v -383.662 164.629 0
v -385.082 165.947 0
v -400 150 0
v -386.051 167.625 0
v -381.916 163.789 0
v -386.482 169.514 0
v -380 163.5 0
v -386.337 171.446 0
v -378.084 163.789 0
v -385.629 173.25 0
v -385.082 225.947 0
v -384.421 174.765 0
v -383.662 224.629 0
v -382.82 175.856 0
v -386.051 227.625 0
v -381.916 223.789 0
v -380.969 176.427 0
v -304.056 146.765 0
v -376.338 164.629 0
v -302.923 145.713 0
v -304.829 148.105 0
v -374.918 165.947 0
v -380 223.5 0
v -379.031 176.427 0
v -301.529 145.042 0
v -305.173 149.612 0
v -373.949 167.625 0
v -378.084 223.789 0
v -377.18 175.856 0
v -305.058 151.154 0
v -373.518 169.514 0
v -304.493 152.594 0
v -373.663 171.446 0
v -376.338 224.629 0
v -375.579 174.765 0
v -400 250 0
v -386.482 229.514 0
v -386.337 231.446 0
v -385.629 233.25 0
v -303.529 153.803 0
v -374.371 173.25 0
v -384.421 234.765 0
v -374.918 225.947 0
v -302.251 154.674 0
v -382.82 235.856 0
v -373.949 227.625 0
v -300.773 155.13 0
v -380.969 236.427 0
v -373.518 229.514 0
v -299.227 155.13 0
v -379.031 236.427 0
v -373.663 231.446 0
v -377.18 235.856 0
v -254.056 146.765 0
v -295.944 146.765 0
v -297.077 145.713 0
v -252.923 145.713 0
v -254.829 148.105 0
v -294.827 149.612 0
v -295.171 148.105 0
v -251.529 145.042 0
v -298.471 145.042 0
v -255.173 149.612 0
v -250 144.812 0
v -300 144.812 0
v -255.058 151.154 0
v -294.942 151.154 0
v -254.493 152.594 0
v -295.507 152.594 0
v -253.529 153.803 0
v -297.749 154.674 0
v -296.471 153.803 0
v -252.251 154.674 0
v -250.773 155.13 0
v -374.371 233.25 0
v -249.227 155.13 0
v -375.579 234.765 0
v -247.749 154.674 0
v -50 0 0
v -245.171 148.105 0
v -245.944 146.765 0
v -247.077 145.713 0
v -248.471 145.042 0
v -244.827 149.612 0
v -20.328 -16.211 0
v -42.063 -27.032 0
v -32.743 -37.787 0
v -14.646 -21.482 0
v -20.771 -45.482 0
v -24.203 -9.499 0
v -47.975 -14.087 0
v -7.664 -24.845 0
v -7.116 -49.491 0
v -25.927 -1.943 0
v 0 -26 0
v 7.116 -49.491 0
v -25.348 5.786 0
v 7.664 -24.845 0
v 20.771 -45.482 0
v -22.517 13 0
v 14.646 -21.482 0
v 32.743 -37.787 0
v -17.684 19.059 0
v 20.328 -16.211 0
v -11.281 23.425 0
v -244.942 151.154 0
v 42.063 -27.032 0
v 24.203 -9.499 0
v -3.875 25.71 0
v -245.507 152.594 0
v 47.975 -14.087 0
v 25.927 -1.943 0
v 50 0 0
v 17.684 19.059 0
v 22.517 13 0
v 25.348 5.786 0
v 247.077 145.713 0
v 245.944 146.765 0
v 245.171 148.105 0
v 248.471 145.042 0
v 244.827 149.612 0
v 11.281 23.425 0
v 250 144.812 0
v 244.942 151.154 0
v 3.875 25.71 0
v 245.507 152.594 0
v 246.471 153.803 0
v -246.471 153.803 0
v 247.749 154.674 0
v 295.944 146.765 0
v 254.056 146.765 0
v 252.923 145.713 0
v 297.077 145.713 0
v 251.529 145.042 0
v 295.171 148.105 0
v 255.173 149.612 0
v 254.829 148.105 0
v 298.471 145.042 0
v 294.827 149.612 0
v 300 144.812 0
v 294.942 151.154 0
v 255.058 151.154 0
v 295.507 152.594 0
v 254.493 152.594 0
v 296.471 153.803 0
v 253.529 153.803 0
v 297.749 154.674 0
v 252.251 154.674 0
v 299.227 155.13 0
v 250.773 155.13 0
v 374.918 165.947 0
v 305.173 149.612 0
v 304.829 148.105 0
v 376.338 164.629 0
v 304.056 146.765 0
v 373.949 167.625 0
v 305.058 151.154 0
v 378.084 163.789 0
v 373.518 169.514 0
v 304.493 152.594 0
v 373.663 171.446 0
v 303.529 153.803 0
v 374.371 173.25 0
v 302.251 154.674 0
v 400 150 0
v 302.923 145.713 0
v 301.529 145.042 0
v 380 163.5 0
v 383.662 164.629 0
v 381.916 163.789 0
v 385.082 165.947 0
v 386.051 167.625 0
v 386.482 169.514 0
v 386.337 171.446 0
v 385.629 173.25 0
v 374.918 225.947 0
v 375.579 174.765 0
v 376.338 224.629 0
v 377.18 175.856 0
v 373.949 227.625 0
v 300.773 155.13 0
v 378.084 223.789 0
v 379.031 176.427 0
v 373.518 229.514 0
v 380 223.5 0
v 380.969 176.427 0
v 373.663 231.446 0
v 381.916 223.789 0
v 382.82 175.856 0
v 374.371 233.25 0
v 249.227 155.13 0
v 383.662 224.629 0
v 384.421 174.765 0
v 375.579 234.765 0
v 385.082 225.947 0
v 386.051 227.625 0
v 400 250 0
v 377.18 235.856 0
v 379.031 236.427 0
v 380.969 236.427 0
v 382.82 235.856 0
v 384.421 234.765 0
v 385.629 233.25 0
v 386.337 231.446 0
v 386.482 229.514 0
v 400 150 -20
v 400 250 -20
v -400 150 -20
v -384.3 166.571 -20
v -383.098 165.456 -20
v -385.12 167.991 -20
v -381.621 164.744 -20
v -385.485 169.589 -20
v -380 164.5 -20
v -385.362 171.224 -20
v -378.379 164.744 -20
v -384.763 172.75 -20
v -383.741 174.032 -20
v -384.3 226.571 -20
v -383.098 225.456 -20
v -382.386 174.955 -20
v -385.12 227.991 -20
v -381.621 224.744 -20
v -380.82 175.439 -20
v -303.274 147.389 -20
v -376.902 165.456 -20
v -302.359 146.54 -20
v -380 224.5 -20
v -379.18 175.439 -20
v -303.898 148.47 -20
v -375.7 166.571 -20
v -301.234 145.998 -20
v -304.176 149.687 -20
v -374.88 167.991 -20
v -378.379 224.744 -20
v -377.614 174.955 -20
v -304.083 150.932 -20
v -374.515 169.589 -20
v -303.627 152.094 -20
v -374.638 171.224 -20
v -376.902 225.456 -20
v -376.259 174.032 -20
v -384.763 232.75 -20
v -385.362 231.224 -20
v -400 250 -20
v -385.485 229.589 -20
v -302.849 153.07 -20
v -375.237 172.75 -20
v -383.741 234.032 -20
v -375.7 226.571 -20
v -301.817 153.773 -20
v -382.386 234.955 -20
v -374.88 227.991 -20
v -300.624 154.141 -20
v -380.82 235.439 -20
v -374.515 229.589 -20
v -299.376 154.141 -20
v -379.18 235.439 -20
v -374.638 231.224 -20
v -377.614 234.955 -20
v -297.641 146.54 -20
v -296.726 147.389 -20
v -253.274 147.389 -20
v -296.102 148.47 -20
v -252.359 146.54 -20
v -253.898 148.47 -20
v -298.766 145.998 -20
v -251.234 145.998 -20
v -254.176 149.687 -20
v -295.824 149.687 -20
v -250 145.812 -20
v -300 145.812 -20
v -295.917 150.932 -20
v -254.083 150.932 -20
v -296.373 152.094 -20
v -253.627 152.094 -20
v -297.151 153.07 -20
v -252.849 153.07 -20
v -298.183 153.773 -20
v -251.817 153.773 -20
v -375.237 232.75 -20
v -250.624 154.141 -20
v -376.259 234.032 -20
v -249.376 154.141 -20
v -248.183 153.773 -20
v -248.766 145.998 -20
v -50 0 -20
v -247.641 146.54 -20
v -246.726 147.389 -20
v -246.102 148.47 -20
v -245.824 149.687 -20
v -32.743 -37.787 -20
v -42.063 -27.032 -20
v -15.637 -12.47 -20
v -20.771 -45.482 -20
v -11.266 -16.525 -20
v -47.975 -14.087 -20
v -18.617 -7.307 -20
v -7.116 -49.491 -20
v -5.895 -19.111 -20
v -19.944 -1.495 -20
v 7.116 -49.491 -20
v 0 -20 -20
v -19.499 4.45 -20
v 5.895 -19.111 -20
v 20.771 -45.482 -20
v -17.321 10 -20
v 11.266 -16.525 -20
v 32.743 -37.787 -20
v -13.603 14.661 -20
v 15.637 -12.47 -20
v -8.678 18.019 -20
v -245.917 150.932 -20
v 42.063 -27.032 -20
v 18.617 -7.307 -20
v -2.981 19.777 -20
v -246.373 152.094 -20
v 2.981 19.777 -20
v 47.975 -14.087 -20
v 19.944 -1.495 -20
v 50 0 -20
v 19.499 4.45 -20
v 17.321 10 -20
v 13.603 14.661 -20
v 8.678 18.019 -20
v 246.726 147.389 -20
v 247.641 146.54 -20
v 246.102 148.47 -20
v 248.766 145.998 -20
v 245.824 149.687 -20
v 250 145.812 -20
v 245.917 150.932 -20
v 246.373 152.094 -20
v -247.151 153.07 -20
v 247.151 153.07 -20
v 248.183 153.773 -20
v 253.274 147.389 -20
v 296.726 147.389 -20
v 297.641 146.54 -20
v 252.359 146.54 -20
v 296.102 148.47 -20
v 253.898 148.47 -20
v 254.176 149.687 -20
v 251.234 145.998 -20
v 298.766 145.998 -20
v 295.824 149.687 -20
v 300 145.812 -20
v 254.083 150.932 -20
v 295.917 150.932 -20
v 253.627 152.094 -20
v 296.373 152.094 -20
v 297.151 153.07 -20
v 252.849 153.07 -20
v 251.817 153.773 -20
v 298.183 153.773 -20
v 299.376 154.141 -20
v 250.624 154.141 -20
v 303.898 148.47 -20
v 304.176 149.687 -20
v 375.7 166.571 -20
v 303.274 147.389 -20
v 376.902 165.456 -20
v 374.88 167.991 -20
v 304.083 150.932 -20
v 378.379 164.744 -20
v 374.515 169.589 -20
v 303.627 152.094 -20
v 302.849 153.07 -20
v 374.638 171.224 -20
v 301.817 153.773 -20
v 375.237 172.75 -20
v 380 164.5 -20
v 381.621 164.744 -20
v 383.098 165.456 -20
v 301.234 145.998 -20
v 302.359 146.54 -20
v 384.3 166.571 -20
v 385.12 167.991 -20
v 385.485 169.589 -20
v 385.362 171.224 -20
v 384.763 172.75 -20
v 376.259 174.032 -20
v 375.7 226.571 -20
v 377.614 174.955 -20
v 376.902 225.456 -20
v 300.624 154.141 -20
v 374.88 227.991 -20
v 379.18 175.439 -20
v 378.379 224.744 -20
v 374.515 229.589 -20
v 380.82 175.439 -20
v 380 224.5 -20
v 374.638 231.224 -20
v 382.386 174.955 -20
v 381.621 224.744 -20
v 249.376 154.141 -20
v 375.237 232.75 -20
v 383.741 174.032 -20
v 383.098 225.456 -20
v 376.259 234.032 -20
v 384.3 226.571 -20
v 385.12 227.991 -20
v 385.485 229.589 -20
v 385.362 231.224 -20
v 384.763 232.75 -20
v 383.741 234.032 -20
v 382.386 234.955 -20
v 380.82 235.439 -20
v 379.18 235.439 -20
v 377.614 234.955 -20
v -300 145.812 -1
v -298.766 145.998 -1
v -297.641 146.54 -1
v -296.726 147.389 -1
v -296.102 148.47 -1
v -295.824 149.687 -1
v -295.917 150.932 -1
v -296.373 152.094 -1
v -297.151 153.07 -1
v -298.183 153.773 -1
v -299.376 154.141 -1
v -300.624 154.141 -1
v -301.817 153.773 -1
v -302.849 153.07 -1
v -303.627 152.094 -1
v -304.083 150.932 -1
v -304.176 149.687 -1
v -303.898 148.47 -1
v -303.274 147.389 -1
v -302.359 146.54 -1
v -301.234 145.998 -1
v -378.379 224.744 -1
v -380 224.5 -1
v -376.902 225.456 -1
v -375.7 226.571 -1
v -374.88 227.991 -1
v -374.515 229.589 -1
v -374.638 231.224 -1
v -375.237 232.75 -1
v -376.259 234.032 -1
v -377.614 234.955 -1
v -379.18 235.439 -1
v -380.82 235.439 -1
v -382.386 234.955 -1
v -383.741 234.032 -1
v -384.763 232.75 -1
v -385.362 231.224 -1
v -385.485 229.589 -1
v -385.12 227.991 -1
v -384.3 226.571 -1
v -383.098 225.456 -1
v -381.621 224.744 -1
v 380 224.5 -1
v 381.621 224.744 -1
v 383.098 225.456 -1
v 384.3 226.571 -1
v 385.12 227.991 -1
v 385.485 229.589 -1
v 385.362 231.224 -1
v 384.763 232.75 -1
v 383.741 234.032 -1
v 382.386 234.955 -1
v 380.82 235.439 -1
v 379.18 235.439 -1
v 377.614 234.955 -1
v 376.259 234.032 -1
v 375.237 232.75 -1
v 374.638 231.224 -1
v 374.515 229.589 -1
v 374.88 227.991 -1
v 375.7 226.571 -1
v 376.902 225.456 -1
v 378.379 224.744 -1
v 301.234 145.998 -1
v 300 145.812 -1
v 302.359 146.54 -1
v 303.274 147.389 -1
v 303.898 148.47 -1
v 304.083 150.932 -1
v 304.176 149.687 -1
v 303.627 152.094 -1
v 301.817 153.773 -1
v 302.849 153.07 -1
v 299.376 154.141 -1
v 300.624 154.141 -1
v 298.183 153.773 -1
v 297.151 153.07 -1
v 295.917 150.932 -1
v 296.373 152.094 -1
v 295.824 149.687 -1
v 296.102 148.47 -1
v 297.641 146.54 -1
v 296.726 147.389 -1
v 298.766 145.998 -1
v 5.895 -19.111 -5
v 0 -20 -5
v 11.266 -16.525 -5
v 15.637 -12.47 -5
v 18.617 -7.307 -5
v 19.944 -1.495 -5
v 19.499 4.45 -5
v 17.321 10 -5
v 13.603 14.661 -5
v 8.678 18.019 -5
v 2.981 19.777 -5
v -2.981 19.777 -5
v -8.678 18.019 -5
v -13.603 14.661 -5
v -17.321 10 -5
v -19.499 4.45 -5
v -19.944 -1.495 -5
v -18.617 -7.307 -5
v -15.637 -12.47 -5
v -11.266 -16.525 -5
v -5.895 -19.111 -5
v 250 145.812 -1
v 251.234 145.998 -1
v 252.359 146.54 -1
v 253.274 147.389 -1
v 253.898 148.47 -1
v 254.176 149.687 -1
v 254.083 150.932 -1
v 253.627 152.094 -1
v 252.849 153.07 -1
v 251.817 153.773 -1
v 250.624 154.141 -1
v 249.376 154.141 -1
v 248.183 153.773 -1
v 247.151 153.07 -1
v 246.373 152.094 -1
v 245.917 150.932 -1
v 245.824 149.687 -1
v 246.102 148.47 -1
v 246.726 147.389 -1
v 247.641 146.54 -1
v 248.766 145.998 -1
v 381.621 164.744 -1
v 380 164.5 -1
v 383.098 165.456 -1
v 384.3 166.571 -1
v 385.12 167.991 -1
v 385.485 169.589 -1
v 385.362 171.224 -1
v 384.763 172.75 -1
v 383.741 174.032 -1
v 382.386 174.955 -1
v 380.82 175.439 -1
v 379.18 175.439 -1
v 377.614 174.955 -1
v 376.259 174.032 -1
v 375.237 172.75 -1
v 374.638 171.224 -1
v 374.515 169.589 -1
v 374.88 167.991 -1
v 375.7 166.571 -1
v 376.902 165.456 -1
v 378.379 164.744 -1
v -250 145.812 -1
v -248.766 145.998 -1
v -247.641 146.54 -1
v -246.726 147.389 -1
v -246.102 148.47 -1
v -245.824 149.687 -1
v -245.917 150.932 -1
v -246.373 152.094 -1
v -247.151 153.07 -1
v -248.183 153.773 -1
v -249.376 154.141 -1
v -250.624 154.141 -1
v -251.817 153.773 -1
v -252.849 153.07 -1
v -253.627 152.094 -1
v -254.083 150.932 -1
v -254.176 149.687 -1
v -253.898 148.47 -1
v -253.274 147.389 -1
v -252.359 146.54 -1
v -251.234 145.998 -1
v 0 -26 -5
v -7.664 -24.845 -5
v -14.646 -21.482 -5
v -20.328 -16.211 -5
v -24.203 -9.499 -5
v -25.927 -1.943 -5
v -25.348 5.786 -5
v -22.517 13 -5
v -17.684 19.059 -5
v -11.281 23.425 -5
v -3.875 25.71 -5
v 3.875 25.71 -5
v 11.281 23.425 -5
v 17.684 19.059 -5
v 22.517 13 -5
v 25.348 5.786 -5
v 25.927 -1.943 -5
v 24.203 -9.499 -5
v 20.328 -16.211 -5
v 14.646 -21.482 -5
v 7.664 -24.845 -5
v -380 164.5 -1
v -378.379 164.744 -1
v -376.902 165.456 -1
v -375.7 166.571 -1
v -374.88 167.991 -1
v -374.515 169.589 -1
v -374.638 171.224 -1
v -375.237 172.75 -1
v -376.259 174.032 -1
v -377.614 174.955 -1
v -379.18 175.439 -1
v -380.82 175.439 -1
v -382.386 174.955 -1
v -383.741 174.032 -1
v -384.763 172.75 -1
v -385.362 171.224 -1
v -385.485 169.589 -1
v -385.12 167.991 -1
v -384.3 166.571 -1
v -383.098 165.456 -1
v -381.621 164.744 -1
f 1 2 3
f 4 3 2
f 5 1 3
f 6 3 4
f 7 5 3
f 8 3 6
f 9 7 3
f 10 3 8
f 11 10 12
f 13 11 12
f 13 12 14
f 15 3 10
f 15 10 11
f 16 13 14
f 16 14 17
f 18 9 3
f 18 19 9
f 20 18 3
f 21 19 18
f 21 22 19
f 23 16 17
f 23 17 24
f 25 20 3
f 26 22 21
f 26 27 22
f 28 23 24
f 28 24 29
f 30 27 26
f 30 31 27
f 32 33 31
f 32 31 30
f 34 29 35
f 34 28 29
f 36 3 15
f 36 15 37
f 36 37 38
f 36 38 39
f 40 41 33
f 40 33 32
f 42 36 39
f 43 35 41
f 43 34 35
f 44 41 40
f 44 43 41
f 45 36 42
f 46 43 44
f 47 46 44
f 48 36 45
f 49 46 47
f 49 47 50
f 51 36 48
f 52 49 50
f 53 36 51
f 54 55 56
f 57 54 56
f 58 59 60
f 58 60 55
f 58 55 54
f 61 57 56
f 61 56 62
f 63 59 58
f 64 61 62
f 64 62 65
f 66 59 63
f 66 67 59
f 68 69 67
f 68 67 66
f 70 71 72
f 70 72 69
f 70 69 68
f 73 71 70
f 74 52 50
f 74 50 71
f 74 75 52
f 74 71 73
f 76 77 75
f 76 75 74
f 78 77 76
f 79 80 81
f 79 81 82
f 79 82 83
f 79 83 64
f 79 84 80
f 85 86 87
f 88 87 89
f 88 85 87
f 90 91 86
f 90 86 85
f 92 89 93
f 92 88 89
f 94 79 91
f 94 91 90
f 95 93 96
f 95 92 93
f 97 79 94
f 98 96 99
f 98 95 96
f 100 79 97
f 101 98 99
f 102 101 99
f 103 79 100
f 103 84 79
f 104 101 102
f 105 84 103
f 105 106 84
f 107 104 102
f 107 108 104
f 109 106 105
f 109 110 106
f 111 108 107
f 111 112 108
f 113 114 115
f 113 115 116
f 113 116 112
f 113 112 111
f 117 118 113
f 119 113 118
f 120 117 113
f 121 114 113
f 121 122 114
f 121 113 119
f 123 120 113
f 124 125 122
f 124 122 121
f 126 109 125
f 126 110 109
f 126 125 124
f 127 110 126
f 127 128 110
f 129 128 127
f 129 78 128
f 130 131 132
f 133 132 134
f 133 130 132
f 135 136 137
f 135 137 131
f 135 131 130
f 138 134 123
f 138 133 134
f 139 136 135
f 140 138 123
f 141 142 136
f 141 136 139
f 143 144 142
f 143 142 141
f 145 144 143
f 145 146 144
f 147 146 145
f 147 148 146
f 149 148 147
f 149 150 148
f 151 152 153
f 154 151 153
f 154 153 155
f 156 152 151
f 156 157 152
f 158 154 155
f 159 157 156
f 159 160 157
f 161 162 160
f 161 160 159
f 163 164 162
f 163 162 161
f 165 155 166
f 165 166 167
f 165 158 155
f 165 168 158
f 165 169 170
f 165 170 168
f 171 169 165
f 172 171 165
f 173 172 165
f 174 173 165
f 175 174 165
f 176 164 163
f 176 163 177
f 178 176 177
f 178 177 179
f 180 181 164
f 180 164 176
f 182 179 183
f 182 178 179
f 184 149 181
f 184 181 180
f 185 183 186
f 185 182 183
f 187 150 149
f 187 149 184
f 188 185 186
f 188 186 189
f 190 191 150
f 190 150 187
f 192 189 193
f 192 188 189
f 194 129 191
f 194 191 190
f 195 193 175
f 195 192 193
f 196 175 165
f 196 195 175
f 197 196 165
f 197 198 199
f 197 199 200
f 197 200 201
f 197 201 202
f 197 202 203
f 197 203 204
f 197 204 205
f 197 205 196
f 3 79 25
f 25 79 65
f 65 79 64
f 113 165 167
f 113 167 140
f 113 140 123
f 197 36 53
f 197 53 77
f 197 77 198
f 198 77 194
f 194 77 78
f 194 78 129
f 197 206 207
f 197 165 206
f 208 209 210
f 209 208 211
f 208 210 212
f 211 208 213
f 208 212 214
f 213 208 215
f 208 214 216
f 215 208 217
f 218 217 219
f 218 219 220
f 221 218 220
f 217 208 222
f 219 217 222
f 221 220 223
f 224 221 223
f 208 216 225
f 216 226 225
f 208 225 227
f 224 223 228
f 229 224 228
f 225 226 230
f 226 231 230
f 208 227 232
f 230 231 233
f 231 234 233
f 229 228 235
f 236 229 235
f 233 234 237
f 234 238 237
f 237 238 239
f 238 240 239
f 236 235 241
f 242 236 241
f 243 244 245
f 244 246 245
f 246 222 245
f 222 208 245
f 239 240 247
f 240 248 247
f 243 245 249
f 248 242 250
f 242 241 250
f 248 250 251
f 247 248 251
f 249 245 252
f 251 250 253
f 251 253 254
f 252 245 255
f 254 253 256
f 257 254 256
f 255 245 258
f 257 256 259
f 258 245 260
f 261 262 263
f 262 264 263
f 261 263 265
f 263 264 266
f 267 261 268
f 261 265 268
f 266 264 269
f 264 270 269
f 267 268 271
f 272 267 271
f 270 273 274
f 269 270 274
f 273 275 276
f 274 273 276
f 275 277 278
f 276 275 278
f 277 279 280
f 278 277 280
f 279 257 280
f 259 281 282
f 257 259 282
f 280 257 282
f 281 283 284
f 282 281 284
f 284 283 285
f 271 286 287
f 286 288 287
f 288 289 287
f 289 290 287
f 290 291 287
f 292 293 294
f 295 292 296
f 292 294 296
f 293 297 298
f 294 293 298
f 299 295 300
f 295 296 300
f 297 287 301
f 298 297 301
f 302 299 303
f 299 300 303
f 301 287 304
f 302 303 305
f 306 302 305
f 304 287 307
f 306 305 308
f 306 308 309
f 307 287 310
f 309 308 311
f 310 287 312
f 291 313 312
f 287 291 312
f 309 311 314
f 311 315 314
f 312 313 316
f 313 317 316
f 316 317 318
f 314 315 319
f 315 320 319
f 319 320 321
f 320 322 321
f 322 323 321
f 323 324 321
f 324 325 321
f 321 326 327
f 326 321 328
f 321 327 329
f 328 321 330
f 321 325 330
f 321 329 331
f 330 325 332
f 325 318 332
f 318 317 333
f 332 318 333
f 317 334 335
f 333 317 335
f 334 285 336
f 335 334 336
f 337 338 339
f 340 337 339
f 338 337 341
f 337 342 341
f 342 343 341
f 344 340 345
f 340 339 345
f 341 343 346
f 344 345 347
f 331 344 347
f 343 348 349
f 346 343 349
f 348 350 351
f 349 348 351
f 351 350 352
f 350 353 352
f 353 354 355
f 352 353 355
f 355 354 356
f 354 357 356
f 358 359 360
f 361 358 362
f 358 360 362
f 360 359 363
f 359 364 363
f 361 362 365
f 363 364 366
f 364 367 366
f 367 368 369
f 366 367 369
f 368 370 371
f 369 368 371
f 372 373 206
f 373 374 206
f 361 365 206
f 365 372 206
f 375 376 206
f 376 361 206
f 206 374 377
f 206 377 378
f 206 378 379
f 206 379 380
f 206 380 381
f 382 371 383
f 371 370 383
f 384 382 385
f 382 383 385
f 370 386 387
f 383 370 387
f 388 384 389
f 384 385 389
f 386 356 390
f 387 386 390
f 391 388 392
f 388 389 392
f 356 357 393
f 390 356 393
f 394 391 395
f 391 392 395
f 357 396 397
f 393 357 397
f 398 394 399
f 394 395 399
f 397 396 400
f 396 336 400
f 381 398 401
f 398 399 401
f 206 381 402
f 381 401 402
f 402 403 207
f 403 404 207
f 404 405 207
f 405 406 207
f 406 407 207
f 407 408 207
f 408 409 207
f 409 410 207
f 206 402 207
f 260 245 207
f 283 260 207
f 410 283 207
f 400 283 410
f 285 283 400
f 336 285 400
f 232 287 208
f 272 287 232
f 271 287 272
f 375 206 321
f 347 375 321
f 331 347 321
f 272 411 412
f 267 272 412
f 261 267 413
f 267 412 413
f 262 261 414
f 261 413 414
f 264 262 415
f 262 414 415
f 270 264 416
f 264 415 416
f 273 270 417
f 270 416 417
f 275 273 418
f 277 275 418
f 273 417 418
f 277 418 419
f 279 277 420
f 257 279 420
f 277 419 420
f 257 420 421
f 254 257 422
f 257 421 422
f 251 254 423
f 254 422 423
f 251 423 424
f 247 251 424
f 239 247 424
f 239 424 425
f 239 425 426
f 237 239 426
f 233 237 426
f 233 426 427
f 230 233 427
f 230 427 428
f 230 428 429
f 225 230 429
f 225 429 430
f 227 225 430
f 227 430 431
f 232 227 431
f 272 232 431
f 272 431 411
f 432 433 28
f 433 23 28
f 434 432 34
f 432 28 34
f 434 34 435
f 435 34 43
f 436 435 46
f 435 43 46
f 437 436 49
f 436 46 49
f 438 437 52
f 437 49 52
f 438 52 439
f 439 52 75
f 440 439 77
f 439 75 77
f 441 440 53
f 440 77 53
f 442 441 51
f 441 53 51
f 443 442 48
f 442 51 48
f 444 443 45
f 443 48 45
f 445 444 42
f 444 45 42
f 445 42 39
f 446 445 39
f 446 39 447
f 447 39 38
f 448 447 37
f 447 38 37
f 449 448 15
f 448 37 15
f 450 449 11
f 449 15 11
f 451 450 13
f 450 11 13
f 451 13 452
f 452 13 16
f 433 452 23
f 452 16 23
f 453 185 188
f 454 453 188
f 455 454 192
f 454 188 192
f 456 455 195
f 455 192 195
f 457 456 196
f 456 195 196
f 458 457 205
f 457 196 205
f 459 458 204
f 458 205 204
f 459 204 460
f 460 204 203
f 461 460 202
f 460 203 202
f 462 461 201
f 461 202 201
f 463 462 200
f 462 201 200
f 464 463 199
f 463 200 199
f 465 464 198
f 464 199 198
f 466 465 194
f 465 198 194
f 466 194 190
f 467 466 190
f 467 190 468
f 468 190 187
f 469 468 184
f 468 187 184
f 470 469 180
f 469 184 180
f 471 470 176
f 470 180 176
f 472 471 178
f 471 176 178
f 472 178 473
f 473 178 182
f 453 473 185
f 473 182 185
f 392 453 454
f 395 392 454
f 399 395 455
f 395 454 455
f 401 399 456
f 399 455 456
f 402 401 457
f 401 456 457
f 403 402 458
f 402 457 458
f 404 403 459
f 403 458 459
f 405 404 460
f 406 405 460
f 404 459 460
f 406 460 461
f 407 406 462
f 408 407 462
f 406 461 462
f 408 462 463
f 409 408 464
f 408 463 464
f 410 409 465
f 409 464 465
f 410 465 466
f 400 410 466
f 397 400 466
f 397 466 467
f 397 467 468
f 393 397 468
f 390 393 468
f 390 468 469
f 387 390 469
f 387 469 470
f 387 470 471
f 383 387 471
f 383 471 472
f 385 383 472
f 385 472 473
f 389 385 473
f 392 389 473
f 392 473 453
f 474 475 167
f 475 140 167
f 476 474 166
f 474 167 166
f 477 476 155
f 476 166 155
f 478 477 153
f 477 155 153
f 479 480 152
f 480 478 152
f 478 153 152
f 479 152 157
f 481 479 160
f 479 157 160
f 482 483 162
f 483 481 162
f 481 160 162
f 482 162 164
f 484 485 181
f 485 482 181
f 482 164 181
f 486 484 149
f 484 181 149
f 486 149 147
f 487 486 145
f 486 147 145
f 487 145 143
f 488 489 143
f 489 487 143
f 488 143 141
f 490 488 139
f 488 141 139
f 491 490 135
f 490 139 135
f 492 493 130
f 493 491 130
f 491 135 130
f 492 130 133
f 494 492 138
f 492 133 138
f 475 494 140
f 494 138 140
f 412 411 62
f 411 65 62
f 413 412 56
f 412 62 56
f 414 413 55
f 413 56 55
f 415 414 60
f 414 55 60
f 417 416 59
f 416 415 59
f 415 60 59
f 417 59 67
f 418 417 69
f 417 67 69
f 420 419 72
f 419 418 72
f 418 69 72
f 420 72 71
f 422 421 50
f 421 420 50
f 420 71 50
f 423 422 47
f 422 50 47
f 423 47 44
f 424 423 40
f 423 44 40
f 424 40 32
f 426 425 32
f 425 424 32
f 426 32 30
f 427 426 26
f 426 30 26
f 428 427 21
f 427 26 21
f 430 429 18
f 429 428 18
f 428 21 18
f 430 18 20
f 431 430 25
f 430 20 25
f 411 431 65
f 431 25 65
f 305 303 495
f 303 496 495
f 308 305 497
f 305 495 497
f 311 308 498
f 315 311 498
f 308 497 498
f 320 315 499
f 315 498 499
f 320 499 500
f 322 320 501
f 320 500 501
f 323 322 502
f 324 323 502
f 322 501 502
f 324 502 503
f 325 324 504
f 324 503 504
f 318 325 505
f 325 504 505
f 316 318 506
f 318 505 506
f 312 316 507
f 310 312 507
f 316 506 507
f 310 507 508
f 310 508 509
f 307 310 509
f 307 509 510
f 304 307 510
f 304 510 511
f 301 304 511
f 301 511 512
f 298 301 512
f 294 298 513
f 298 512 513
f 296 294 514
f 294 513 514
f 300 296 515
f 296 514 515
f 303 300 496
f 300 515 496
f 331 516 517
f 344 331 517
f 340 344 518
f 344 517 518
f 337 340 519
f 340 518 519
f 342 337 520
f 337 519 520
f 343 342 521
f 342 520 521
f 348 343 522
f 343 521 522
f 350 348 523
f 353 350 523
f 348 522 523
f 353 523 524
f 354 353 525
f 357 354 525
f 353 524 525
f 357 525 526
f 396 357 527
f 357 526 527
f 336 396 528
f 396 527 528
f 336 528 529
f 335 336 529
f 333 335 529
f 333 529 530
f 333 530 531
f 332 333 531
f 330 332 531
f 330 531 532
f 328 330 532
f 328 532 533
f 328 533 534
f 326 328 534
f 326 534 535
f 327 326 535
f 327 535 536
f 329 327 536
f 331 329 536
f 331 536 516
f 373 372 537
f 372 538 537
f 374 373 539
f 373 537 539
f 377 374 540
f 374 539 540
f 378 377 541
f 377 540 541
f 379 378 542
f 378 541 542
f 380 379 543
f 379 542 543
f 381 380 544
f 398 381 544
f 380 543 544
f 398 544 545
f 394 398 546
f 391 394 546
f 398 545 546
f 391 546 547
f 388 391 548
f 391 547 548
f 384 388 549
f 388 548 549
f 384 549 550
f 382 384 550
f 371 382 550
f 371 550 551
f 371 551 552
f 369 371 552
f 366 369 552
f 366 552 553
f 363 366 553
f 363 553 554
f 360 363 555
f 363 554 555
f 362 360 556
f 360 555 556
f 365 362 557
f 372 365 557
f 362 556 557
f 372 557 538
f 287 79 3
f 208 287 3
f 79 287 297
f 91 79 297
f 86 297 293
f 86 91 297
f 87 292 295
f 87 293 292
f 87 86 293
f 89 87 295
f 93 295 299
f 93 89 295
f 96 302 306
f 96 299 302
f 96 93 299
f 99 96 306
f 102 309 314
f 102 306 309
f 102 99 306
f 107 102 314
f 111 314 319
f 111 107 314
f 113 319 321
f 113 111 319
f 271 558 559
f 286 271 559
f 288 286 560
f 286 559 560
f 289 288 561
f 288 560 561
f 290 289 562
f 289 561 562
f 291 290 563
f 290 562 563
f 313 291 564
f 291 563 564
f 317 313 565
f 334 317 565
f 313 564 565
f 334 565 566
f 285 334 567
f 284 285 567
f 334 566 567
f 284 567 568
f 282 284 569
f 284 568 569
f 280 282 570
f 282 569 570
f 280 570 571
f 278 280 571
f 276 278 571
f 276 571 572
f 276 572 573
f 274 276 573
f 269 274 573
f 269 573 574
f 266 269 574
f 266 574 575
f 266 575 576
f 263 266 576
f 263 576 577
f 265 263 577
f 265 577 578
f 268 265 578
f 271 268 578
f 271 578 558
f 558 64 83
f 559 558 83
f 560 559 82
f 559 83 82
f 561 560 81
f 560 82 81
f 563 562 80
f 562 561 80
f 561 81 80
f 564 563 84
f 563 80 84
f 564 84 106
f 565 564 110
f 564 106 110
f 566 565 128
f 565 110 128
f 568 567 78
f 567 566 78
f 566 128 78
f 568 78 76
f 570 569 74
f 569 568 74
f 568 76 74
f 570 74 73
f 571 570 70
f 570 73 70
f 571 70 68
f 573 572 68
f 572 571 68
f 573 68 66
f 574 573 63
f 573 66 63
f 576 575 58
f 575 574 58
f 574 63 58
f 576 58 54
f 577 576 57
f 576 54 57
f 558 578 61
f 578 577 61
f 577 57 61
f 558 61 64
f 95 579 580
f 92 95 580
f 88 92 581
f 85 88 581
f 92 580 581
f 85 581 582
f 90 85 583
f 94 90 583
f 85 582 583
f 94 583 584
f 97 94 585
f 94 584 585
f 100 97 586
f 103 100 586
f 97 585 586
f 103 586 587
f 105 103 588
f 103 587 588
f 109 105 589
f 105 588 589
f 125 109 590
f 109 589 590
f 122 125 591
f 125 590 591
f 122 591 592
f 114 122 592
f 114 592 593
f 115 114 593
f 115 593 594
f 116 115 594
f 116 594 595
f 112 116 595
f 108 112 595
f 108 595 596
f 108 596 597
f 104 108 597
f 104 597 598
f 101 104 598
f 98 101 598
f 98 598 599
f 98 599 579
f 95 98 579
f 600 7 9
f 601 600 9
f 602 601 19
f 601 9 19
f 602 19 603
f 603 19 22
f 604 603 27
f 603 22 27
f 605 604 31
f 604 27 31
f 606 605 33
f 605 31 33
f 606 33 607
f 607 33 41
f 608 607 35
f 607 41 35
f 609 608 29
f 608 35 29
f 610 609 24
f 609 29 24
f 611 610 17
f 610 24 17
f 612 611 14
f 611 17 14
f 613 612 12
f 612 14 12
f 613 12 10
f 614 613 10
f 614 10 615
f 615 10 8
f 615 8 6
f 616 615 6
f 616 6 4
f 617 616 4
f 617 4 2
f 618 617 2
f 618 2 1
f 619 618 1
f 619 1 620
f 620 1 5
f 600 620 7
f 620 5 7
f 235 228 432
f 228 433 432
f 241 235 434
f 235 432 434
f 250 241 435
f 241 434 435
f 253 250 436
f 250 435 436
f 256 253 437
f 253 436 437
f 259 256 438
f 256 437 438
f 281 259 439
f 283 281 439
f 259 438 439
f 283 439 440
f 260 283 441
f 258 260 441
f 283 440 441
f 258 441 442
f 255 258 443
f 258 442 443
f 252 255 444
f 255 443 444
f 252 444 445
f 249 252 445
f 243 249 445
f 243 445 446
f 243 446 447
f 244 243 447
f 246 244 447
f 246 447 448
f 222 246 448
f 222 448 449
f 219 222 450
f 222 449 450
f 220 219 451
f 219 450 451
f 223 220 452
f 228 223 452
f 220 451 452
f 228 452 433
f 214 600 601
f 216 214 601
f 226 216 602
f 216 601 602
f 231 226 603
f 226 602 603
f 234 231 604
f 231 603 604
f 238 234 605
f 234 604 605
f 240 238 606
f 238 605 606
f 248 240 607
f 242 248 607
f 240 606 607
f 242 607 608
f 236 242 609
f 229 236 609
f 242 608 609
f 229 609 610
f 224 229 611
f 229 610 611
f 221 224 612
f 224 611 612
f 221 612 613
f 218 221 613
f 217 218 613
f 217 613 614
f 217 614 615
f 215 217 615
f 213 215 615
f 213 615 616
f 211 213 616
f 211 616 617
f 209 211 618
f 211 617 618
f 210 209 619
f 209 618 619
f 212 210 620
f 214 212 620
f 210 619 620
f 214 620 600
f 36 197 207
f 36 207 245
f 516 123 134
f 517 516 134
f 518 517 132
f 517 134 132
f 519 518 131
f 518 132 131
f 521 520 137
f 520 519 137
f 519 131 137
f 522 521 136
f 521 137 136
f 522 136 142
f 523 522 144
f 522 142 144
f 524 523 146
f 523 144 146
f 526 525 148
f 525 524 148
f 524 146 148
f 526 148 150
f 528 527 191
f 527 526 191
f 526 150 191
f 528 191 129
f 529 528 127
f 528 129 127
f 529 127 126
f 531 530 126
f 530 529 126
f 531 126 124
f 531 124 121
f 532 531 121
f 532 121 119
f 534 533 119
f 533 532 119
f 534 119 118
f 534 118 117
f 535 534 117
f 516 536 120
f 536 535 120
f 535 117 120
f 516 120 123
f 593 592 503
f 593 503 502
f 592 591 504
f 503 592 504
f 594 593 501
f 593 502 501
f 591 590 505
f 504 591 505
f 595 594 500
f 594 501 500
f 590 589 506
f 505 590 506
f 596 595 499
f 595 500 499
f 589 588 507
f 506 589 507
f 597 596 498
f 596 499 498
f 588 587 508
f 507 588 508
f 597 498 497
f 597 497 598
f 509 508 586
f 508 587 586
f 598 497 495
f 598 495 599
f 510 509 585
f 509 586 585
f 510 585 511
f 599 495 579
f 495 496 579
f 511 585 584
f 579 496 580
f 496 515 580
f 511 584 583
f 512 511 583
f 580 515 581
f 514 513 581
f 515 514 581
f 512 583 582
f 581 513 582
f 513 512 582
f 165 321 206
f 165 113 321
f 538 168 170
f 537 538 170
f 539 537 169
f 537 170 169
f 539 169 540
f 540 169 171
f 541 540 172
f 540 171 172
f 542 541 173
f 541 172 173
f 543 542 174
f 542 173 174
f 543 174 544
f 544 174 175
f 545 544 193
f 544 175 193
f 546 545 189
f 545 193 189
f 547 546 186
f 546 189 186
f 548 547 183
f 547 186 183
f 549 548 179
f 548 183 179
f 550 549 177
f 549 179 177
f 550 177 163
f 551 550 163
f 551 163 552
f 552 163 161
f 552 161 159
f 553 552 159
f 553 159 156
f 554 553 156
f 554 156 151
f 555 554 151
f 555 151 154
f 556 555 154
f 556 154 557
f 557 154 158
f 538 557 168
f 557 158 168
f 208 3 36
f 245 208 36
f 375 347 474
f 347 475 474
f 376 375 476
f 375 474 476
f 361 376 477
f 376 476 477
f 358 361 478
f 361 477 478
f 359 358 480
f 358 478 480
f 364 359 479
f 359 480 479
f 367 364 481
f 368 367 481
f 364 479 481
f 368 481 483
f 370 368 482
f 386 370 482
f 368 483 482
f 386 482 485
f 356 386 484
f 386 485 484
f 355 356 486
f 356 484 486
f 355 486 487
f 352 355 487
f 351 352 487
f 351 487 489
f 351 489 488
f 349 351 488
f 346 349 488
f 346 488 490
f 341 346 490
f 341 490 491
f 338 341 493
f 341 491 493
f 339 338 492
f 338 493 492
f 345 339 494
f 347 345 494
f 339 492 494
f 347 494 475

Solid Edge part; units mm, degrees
sketch "Sketch1" plane through (0, 0, 0) normal (0, 0, 1) x (1, 0, 0)
  line L0 (400, 250) -> (-400, 250)
  line L1 (-400, 150) -> (-400, 250)
  line L2 (-50, 0) -> (-400, 150)
  arc A0 (50, 0) -> (-50, 0) centre (0, 0) cw
  line L3 (50, 0) -> (400, 150)
  line L4 (400, 150) -> (400, 250)
extrude "Protrusion1" add sketch "Sketch1" against normal blind 20
hole "Bohrung_1" at (0, 0, 0) direction (0, 0, -1) diameter 40 end up to next
hole "Bohrung_2" at (0, 0, 0) direction (0, 0, -1) diameter 52 depth 5
hole "Bohrung_3" at (-380, 230, 0) direction (0, 0, -1) diameter 11 end up to next start chamfer 1 start chamfer angle 45
hole "Hole1" at (-380, 170, 0) direction (0, 0, -1) diameter 11 end up to next start chamfer 1 start chamfer angle 45
hole "Hole2" at (380, 170, 0) direction (0, 0, -1) diameter 11 end up to next start chamfer 1 start chamfer angle 45
hole "Hole3" at (380, 230, 0) direction (0, 0, -1) diameter 11 end up to next start chamfer 1 start chamfer angle 45
hole "Bohrung_7" at (-300, 150, 0) direction (0, 0, -1) diameter 8.376 end up to next start chamfer 1 start chamfer angle 45
hole "Hole4" at (-250, 150, 0) direction (0, 0, -1) diameter 8.376 end up to next start chamfer 1 start chamfer angle 45
hole "Hole5" at (300, 150, 0) direction (0, 0, -1) diameter 8.376 end up to next start chamfer 1 start chamfer angle 45
hole "Hole6" at (250, 150, 0) direction (0, 0, -1) diameter 8.376 end up to next start chamfer 1 start chamfer angle 45
